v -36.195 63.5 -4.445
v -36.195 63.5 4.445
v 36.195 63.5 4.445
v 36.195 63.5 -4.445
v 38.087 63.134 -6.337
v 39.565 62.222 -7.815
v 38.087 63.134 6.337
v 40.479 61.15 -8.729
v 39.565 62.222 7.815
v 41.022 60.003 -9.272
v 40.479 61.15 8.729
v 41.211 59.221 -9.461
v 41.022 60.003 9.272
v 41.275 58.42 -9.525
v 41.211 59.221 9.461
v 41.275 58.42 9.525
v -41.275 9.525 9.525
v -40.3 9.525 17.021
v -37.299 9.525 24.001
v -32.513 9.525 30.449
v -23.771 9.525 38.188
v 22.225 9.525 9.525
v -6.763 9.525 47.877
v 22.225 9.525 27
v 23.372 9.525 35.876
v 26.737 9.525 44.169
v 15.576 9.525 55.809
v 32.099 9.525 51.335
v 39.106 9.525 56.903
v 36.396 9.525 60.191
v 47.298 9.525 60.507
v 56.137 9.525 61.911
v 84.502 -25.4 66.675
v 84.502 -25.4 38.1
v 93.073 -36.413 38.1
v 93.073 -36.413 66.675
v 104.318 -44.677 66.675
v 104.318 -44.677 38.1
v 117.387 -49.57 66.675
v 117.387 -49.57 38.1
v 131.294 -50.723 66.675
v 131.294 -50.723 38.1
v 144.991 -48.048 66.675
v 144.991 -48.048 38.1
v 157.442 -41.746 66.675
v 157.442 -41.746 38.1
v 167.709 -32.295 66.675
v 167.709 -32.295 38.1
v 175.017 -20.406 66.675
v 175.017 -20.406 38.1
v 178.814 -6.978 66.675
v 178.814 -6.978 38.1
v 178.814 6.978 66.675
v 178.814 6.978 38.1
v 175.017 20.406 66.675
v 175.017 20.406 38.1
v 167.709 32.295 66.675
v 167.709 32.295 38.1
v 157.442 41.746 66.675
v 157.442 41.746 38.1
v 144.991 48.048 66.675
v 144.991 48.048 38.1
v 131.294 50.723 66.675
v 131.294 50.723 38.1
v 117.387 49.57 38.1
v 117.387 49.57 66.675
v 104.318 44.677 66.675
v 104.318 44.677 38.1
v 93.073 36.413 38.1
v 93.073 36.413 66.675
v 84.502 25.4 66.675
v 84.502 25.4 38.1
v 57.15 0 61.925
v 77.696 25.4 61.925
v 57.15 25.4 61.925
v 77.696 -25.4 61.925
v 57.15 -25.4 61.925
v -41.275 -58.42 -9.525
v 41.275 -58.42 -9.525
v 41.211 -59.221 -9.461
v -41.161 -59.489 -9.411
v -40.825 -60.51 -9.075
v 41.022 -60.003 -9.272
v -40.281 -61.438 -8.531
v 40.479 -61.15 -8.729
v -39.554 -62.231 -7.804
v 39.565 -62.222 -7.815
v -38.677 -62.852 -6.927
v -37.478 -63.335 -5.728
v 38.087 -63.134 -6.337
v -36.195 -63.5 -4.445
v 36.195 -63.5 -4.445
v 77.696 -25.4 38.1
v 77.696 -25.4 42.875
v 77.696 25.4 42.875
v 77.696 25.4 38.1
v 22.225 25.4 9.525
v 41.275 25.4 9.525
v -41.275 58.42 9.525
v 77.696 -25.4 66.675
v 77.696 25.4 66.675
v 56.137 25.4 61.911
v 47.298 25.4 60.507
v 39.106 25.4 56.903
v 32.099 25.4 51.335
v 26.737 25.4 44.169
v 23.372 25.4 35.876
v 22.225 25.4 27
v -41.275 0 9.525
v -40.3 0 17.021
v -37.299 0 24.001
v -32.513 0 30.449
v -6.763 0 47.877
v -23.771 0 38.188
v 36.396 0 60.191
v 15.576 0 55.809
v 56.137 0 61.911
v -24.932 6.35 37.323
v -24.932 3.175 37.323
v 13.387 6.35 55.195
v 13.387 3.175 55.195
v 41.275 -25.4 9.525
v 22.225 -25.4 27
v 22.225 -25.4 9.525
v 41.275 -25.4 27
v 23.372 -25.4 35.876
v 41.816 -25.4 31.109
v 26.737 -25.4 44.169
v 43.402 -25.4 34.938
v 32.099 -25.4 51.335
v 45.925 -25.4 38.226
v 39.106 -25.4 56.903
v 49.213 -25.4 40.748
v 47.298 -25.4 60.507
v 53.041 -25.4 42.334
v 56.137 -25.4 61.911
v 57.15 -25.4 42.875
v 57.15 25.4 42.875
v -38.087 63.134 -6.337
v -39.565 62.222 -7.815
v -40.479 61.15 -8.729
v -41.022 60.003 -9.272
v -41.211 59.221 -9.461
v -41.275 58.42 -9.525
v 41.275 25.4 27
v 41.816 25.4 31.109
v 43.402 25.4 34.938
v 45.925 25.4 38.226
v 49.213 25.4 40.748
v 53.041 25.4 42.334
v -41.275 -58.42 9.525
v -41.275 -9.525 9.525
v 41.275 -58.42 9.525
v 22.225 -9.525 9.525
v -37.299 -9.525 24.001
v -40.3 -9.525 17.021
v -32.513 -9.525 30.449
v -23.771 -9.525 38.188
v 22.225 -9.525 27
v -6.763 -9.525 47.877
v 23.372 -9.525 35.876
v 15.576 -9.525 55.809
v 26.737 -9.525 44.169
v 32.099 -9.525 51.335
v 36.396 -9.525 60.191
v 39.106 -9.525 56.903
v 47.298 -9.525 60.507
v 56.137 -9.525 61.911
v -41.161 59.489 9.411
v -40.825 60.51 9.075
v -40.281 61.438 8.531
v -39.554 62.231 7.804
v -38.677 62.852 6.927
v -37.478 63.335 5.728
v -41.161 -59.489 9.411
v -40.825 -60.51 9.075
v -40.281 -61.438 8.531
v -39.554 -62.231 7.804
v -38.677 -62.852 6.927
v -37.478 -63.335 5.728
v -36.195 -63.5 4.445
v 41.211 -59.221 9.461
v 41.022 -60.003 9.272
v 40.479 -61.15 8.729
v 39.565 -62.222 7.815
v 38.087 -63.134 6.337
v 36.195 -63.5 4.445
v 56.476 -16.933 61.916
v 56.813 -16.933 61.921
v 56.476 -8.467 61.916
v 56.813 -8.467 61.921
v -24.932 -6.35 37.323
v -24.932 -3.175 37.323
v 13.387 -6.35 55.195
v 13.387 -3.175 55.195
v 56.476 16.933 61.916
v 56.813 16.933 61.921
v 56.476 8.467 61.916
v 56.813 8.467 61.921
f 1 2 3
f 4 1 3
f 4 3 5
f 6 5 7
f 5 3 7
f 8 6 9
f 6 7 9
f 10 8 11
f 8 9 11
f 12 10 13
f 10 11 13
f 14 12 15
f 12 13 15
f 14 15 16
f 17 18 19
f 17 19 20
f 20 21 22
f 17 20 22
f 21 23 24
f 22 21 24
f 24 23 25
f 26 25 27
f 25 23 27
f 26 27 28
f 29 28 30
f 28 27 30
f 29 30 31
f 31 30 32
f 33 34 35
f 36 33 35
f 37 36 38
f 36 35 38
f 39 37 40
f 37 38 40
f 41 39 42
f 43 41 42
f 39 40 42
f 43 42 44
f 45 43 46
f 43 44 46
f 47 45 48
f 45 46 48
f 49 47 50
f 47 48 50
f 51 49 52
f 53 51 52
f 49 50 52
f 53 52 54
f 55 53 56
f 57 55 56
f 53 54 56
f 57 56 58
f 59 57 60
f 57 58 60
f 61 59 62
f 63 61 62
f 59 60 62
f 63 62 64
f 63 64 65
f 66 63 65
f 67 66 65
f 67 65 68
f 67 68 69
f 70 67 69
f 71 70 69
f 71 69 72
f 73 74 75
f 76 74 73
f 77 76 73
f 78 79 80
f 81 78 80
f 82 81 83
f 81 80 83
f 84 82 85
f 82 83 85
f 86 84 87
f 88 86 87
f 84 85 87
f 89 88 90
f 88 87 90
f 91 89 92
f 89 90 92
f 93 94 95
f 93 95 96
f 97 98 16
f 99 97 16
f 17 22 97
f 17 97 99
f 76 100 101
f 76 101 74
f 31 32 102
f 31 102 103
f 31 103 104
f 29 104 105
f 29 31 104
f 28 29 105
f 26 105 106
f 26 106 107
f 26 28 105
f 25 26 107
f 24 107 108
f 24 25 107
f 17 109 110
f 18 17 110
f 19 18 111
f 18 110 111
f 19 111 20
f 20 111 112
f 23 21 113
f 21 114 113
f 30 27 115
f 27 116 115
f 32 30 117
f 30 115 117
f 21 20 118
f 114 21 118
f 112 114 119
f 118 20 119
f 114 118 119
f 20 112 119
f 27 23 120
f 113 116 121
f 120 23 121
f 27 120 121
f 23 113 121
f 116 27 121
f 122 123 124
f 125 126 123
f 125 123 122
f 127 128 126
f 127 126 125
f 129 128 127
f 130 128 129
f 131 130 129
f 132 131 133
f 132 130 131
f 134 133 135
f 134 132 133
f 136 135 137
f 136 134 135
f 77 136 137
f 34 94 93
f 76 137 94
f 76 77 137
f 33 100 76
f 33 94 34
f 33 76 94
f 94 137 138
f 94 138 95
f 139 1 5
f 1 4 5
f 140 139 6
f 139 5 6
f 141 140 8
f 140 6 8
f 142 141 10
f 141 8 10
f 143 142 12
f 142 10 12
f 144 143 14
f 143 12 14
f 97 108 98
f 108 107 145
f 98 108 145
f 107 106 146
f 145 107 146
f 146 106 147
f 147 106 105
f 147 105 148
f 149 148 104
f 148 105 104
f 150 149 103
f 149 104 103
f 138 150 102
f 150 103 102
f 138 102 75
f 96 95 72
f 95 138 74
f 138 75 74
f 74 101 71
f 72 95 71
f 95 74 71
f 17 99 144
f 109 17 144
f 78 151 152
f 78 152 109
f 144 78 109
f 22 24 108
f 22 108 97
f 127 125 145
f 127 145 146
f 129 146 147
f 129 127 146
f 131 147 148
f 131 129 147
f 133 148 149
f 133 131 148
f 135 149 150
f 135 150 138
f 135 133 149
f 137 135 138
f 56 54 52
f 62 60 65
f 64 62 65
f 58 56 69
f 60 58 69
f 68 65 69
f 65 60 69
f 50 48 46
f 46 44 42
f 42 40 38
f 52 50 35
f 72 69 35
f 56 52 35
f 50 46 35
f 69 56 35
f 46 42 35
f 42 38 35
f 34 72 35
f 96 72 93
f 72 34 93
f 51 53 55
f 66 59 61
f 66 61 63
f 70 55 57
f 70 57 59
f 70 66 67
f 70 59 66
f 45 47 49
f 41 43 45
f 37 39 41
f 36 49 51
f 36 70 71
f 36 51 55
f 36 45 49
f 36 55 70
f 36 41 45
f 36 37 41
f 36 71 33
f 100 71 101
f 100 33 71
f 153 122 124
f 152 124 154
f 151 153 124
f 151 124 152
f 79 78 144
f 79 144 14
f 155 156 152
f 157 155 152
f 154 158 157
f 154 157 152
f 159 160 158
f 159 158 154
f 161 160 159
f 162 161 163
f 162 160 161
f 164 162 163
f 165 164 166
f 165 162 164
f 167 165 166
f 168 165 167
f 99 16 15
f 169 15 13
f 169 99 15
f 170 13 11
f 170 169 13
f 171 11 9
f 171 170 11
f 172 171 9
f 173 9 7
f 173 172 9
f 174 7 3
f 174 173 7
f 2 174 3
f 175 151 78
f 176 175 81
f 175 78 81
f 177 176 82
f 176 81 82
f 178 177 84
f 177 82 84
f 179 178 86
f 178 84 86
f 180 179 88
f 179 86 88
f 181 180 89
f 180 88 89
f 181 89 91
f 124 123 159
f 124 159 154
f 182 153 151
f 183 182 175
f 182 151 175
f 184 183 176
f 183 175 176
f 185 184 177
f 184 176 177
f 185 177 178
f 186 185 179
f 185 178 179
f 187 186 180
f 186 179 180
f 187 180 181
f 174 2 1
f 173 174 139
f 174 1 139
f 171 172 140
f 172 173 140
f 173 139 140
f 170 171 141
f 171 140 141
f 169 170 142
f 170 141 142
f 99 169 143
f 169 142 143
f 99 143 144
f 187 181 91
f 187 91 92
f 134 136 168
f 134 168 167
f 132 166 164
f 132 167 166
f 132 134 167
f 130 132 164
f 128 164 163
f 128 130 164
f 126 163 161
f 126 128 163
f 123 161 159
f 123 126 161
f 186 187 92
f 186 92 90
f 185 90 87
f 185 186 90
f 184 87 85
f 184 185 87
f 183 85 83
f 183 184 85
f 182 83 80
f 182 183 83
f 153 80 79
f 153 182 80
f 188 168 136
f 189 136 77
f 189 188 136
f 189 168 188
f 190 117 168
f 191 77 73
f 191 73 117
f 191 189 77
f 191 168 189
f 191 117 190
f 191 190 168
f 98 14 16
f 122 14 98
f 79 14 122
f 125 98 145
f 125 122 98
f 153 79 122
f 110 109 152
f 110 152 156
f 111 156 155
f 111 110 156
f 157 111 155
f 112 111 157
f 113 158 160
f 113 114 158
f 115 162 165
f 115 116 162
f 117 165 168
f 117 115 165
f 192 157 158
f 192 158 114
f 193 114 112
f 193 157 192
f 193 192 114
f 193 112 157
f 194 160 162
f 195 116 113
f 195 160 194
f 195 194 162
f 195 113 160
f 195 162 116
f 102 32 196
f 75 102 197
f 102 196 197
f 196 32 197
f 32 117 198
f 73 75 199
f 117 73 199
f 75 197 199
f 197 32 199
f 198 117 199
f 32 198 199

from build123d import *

# Parameters (mm, degrees)
F1_DEPTH = 63.5
F2_DEPTH = 25.4
F3_DEPTH = 9.525
F5_R     = 5.08


with BuildPart() as f1:
    # F0 (on Front) → F1 (new body, symmetric)
    with BuildSketch(Plane.XZ):
        Polygon((41.275, -9.525), (41.275, 9.525), (22.225, 9.525), (-41.275, 9.525), (-41.275, -9.525), align=None)
    extrude(amount=F1_DEPTH, both=True)

    # F0 (on Front) → F2 (join, symmetric)
    with BuildSketch(Plane.XZ):
        with BuildLine():
            Line((22.225, 9.525), (41.275, 9.525))
            Line((41.275, 9.525), (41.275, 27.0002))
            ThreePointArc((41.275, 27.0002), (45.92468, 38.22552), (57.15, 42.8752))
            Line((57.15, 42.8752), (77.695822, 42.8752))
            Line((77.695822, 42.8752), (77.695822, 61.9252))
            Line((77.695822, 61.9252), (57.15, 61.9252))
            add(Edge.make_bspline(
                [(56.136897, 61.910503), (56.476094, 61.9168), (56.813813, 61.921701), (57.15, 61.9252)],
                knots=[110.545926, 110.545926, 110.545926, 110.545926, 111.504536, 111.504536, 111.504536, 111.504536], degree=3))
            ThreePointArc((56.136897, 61.910503), (32.09867, 51.335082), (22.225, 27.0002))
            Line((22.225, 27.0002), (22.225, 9.525))
        make_face()
        Polygon((77.695822, 61.9252), (77.695822, 42.8752), (77.695822, 38.1), (128.495822, 38.1), (128.495822, 66.675), (77.695822, 66.675), align=None)
    extrude(amount=F2_DEPTH, both=True)

    # F0 (on Front) → F3 (join, symmetric)
    with BuildSketch(Plane.XZ):
        with BuildLine():
            Line((-41.275, 9.525), (22.225, 9.525))
            Line((22.225, 9.525), (22.225, 27.0002))
            ThreePointArc((22.225, 27.0002), (32.09867, 51.335082), (56.136897, 61.910503))
            add(Edge.make_bspline(
                [(-41.275, 9.525), (-41.7684, 41.876246), (17.020968, 61.184278), (56.136897, 61.910503)],
                knots=[0, 0, 0, 0, 110.545926, 110.545926, 110.545926, 110.545926], degree=3))
        make_face()
    extrude(amount=F3_DEPTH, both=True)

    # F0 (on Front) → F4 (revolve)
    with BuildSketch(Plane.XZ):
        Polygon((77.695822, 61.9252), (77.695822, 42.8752), (77.695822, 38.1), (128.495822, 38.1), (128.495822, 66.675), (77.695822, 66.675), align=None)
    revolve(axis=Axis((128.495822, 0, 52.3875), (0, 0, 1)))

    # F5
    f5_edges = [f1.edges().sort_by_distance(p)[0] for p in [
        (41.275, 63.5, 0),
        (0, 63.5, 9.525),
        (-41.275, 63.5, 0),
        (0, 63.5, -9.525),
        (41.275, -63.5, 0),
        (0, -63.5, 9.525),
        (-41.275, -63.5, 0),
        (0, -63.5, -9.525),
    ]]
    fillet(f5_edges, radius=F5_R)


solid = f1.part
